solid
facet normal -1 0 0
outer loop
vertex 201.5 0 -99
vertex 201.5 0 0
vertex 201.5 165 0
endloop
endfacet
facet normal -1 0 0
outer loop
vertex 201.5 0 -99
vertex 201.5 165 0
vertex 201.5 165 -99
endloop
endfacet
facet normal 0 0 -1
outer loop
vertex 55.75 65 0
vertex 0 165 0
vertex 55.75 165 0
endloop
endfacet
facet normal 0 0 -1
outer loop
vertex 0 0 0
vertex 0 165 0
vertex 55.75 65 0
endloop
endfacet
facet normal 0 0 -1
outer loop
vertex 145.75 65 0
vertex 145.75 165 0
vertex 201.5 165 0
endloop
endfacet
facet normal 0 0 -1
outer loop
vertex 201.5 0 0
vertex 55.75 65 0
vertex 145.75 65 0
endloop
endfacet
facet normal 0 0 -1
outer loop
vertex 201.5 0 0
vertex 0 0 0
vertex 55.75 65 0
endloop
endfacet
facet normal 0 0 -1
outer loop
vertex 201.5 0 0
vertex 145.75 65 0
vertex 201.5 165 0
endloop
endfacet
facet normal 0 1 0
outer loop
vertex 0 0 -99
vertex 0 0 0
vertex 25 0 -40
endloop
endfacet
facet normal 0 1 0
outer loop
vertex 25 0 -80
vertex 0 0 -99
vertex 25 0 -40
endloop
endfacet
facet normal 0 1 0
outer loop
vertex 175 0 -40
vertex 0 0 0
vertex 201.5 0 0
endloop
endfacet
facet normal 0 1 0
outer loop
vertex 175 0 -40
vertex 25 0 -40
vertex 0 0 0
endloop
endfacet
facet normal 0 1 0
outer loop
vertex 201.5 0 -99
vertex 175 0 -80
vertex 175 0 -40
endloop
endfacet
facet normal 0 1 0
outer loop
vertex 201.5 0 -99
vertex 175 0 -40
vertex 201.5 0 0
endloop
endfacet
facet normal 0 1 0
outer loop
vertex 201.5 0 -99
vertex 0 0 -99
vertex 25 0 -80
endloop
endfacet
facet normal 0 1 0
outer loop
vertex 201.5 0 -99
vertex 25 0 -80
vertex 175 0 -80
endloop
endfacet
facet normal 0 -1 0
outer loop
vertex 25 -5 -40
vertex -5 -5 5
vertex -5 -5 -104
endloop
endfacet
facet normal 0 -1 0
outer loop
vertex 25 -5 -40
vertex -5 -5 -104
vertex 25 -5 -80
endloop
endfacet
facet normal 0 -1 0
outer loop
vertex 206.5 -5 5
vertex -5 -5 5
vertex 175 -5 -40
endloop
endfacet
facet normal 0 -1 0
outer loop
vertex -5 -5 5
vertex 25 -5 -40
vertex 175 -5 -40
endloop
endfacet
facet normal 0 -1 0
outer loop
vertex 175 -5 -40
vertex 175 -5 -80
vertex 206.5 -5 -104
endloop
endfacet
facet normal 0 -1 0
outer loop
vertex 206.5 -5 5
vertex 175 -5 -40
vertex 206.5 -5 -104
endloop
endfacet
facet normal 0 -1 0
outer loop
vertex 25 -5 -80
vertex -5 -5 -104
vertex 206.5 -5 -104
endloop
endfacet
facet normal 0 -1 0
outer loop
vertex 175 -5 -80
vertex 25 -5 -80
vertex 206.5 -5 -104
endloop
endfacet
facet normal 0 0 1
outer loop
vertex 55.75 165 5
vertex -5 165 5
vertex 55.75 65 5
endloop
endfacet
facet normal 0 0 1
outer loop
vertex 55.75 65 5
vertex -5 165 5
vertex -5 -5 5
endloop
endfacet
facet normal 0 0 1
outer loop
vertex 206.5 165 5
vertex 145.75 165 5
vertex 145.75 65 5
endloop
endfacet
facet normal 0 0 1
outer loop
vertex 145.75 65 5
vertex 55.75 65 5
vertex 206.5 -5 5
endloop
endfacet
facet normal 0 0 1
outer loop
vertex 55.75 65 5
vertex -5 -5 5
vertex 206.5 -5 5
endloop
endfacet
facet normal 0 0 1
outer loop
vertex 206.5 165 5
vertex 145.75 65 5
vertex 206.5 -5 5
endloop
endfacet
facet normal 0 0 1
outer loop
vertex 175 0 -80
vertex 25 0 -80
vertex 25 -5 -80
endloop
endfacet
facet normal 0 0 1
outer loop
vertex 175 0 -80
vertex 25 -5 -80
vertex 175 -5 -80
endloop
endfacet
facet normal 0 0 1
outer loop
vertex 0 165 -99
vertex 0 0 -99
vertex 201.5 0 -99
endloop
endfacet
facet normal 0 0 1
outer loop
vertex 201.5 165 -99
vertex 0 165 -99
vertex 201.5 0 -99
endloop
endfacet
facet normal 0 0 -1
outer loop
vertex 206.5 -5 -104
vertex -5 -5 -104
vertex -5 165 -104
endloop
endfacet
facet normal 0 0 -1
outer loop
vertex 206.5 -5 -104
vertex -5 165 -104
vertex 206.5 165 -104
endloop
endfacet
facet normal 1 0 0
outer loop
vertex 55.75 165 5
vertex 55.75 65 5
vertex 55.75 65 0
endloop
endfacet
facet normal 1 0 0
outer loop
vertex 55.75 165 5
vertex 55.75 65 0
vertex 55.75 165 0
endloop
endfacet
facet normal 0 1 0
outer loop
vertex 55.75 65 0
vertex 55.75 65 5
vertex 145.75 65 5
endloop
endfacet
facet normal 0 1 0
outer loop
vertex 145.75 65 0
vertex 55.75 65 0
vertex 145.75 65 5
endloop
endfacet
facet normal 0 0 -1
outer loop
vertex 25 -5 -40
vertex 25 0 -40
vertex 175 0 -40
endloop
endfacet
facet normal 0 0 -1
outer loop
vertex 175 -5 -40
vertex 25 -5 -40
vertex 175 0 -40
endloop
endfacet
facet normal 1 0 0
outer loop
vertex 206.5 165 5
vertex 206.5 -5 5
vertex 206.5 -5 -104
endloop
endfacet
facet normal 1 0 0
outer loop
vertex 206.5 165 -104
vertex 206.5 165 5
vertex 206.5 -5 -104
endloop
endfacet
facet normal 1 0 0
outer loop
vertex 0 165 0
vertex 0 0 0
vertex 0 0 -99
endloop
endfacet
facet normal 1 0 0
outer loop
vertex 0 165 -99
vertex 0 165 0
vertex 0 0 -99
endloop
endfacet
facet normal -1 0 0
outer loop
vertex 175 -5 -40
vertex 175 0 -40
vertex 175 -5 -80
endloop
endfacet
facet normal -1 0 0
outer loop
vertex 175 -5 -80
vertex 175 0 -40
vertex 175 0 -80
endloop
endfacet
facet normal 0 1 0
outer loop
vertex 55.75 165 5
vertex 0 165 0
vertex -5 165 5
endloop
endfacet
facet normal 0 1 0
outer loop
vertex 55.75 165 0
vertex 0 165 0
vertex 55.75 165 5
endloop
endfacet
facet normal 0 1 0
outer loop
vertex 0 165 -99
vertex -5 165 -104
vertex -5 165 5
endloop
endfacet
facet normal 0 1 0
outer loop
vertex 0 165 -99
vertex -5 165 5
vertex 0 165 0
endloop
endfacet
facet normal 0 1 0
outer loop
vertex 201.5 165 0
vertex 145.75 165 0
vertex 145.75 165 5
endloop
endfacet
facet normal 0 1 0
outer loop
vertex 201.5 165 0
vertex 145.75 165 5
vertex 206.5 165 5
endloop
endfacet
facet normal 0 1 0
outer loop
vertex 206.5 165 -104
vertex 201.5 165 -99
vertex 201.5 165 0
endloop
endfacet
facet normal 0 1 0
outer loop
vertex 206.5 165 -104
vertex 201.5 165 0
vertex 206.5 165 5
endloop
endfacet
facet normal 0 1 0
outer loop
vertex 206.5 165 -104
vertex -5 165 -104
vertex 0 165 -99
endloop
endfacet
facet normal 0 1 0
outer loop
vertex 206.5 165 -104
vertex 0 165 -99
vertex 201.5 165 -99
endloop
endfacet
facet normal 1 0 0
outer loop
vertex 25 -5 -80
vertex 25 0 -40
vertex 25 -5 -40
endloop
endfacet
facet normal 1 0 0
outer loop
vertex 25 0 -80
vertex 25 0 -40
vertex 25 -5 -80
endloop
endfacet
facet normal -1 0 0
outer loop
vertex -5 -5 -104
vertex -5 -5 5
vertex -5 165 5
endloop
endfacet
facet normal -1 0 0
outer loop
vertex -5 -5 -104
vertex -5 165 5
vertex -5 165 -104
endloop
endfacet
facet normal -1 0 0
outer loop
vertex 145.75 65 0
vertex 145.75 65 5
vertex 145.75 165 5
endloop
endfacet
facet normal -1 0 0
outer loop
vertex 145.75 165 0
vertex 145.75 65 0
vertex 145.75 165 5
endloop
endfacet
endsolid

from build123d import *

# Parameters (mm, degrees)
SKETCH6_W           = 201.5
SKETCH6_H           = 99
BOSS_EXTRUDE1_DEPTH = 165
SHELL1_T            = 5
SKETCH7_W           = 150
SKETCH7_H           = 40
CUT_EXTRUDE1_DEPTH  = 165
CUT_EXTRUDE2_REACH  = 287.917
SKETCH8_W           = 90
SKETCH8_H           = 100


with BuildPart() as part:
    # Sketch6 → Boss-Extrude1 (new body)
    with BuildSketch(Plane(origin=(0, 0, 0), x_dir=(1, 0, 0), z_dir=(0, 1, 0))):
        with Locations((100.75, 49.5)):
            Rectangle(SKETCH6_W, SKETCH6_H)
    extrude(amount=BOSS_EXTRUDE1_DEPTH)

    # Shell1
    shell1_openings = [part.faces().sort_by_distance(p)[0] for p in [
        (100.75, 165, -49.5),
    ]]
    offset(amount=SHELL1_T, openings=shell1_openings, kind=Kind.INTERSECTION)

    # Sketch7 → Cut-Extrude1 (cut)
    with BuildSketch(Plane(origin=(0, 0, 0), x_dir=(1, 0, 0), z_dir=(0, 1, 0))):
        with Locations((100, 60)):
            Rectangle(SKETCH7_W, SKETCH7_H)
    extrude(amount=-CUT_EXTRUDE1_DEPTH, mode=Mode.SUBTRACT)

    # Sketch8 → Cut-Extrude2 (cut, up to next)
    with BuildSketch(Plane.XY.offset(5), mode=Mode.PRIVATE) as cut_extrude2_sk1:
        with Locations((100.75, 115)):
            Rectangle(SKETCH8_W, SKETCH8_H)
    cut_extrude2_tool1 = extrude(cut_extrude2_sk1.sketch, amount=-CUT_EXTRUDE2_REACH, mode=Mode.PRIVATE) & part.part
    add(cut_extrude2_tool1.solids().sort_by_distance((100.75, 115, 5))[0], mode=Mode.SUBTRACT)


solid = part.part
